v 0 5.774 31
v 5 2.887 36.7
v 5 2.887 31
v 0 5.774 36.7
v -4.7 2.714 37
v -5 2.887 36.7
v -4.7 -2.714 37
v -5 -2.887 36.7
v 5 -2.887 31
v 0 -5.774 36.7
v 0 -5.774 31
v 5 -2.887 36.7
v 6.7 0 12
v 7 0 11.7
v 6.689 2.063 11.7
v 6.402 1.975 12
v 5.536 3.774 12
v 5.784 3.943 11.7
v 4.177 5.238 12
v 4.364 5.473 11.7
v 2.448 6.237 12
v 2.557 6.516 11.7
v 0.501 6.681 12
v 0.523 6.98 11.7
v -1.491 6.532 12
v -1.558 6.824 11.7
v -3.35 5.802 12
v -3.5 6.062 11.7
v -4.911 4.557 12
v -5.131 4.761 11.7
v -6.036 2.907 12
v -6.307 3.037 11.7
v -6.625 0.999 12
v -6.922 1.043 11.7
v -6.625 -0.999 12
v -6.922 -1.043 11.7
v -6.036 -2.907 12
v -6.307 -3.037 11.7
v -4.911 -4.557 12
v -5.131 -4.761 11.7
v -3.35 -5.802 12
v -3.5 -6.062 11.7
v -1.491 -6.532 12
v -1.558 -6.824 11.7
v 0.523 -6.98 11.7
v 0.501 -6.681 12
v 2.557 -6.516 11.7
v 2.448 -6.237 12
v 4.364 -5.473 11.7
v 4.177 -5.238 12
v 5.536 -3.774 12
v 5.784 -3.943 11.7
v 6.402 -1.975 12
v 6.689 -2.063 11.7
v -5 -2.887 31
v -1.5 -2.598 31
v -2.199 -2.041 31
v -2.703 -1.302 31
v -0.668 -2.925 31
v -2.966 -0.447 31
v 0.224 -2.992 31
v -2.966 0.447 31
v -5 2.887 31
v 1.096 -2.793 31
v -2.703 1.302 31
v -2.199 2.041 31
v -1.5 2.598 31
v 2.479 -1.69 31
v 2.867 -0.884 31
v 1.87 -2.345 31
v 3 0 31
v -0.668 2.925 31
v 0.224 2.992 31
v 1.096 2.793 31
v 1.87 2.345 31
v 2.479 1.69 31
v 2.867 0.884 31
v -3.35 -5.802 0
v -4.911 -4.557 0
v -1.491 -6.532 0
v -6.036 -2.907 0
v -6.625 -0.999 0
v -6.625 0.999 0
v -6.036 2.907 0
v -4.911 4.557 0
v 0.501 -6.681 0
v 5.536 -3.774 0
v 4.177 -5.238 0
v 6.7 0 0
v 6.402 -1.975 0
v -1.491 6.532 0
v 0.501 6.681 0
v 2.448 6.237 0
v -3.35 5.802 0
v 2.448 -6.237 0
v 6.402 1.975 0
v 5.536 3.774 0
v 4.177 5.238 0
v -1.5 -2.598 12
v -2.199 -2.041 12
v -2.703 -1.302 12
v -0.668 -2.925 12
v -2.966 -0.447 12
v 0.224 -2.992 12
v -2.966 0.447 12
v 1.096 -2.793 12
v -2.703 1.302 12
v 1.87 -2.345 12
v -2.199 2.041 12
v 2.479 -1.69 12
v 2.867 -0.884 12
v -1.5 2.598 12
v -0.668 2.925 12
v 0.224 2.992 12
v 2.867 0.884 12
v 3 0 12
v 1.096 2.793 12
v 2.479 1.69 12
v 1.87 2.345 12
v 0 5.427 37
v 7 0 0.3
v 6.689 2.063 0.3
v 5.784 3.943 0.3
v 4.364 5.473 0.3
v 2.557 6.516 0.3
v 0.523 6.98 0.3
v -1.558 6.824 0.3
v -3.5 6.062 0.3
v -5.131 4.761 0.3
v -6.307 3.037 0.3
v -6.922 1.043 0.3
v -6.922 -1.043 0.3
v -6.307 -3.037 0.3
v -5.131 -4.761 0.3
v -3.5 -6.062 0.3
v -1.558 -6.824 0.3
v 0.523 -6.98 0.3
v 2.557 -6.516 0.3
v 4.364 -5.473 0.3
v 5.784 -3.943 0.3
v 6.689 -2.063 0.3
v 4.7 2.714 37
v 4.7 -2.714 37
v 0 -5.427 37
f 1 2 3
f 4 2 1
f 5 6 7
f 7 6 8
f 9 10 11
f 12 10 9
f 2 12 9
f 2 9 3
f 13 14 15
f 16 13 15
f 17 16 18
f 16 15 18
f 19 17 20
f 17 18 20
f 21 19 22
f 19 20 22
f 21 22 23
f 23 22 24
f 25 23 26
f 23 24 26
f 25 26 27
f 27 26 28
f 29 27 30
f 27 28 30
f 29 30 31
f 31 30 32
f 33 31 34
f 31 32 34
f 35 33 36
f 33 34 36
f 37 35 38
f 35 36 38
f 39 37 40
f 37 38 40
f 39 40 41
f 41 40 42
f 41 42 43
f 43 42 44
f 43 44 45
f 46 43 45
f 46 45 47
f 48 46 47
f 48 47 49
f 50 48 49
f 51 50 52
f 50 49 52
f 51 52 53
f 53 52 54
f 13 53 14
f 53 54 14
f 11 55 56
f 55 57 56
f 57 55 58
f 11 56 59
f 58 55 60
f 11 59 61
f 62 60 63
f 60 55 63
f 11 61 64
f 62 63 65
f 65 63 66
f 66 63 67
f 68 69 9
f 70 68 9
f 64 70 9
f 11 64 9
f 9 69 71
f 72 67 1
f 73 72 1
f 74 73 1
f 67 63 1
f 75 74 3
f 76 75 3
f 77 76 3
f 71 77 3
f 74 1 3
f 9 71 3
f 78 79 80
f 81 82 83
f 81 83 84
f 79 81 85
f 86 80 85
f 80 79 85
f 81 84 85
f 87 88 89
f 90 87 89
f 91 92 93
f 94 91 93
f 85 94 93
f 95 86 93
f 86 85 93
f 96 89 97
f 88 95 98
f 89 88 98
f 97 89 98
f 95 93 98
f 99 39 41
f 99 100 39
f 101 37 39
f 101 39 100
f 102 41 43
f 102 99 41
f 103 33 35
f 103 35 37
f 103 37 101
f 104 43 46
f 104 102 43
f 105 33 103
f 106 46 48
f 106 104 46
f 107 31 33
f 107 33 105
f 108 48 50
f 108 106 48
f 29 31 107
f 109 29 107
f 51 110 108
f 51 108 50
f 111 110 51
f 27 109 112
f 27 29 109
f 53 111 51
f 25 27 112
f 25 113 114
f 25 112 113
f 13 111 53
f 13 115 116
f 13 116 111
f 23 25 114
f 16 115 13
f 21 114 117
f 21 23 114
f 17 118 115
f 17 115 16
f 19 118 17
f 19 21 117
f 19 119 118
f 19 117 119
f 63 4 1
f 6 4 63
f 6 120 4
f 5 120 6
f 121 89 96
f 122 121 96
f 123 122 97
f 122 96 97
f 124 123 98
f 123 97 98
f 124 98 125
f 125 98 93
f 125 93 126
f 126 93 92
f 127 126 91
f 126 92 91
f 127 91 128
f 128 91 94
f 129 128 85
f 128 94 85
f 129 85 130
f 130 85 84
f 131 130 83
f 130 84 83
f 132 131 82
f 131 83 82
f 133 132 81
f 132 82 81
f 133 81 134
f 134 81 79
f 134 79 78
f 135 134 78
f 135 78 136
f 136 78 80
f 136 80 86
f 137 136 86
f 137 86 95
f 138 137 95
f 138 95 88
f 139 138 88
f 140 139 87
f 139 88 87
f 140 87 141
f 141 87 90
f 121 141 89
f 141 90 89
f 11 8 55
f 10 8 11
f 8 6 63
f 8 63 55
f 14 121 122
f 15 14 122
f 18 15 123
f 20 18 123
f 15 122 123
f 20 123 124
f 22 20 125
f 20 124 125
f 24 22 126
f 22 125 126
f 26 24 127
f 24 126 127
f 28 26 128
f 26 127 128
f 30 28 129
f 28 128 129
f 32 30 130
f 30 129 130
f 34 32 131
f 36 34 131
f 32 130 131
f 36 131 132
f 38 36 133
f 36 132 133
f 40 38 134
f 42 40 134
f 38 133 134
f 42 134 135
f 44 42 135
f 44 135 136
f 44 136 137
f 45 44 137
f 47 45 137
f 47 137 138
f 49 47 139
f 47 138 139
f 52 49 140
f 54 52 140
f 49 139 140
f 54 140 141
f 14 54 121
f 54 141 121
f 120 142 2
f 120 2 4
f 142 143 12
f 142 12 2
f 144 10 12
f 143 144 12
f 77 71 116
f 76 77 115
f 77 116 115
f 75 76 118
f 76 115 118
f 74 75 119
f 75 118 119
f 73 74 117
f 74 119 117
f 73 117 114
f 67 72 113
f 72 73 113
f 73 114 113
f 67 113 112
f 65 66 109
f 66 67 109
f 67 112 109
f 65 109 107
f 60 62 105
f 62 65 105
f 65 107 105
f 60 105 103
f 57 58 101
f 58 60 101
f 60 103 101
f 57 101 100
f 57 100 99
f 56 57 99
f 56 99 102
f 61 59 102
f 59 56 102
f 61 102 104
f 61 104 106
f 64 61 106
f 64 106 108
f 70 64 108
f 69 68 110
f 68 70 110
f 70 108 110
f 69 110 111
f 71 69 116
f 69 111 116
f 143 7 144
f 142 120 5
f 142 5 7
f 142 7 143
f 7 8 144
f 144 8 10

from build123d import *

# Parameters (mm, degrees)
SKETCH_1_R      = 7
EXTRUDE_1_DEPTH = 12
SKETCH_2_R      = 3
EXTRUDE_2_DEPTH = 25
EXTRUDE_3_DEPTH = 6
CHAMFER_1_SIZE  = 0.3


with BuildPart() as part:
    # 草图1 → 凸台-拉伸1 (new body)
    with BuildSketch(Plane.XY):
        Circle(SKETCH_1_R)
    extrude(amount=EXTRUDE_1_DEPTH)

    # 草图2 → 凸台-拉伸2 (add)
    with BuildSketch(Plane.XY.offset(12)):
        Circle(SKETCH_2_R)
    extrude(amount=EXTRUDE_2_DEPTH)

    # 草图3 → 凸台-拉伸3 (add)
    with BuildSketch(Plane.XY.offset(37)):
        Polygon((5, 2.886751346), (0, 5.773502692), (-5, 2.886751346), (-5, -2.886751346), (0, -5.773502692), (5, -2.886751346), align=None)
    extrude(amount=-EXTRUDE_3_DEPTH)

    # 倒角1
    chamfer_1_edges = [part.edges().sort_by_distance(p)[0] for p in [
        (5, 0, 37),
        (2.5, 4.330127019, 37),
        (-2.5, 4.330127019, 37),
        (-5, 0, 37),
        (-2.5, -4.330127019, 37),
        (2.5, -4.330127019, 37),
        (-7, 0, 0),
        (-7, 0, 12),
    ]]
    chamfer(chamfer_1_edges, length=CHAMFER_1_SIZE)


solid = part.part
